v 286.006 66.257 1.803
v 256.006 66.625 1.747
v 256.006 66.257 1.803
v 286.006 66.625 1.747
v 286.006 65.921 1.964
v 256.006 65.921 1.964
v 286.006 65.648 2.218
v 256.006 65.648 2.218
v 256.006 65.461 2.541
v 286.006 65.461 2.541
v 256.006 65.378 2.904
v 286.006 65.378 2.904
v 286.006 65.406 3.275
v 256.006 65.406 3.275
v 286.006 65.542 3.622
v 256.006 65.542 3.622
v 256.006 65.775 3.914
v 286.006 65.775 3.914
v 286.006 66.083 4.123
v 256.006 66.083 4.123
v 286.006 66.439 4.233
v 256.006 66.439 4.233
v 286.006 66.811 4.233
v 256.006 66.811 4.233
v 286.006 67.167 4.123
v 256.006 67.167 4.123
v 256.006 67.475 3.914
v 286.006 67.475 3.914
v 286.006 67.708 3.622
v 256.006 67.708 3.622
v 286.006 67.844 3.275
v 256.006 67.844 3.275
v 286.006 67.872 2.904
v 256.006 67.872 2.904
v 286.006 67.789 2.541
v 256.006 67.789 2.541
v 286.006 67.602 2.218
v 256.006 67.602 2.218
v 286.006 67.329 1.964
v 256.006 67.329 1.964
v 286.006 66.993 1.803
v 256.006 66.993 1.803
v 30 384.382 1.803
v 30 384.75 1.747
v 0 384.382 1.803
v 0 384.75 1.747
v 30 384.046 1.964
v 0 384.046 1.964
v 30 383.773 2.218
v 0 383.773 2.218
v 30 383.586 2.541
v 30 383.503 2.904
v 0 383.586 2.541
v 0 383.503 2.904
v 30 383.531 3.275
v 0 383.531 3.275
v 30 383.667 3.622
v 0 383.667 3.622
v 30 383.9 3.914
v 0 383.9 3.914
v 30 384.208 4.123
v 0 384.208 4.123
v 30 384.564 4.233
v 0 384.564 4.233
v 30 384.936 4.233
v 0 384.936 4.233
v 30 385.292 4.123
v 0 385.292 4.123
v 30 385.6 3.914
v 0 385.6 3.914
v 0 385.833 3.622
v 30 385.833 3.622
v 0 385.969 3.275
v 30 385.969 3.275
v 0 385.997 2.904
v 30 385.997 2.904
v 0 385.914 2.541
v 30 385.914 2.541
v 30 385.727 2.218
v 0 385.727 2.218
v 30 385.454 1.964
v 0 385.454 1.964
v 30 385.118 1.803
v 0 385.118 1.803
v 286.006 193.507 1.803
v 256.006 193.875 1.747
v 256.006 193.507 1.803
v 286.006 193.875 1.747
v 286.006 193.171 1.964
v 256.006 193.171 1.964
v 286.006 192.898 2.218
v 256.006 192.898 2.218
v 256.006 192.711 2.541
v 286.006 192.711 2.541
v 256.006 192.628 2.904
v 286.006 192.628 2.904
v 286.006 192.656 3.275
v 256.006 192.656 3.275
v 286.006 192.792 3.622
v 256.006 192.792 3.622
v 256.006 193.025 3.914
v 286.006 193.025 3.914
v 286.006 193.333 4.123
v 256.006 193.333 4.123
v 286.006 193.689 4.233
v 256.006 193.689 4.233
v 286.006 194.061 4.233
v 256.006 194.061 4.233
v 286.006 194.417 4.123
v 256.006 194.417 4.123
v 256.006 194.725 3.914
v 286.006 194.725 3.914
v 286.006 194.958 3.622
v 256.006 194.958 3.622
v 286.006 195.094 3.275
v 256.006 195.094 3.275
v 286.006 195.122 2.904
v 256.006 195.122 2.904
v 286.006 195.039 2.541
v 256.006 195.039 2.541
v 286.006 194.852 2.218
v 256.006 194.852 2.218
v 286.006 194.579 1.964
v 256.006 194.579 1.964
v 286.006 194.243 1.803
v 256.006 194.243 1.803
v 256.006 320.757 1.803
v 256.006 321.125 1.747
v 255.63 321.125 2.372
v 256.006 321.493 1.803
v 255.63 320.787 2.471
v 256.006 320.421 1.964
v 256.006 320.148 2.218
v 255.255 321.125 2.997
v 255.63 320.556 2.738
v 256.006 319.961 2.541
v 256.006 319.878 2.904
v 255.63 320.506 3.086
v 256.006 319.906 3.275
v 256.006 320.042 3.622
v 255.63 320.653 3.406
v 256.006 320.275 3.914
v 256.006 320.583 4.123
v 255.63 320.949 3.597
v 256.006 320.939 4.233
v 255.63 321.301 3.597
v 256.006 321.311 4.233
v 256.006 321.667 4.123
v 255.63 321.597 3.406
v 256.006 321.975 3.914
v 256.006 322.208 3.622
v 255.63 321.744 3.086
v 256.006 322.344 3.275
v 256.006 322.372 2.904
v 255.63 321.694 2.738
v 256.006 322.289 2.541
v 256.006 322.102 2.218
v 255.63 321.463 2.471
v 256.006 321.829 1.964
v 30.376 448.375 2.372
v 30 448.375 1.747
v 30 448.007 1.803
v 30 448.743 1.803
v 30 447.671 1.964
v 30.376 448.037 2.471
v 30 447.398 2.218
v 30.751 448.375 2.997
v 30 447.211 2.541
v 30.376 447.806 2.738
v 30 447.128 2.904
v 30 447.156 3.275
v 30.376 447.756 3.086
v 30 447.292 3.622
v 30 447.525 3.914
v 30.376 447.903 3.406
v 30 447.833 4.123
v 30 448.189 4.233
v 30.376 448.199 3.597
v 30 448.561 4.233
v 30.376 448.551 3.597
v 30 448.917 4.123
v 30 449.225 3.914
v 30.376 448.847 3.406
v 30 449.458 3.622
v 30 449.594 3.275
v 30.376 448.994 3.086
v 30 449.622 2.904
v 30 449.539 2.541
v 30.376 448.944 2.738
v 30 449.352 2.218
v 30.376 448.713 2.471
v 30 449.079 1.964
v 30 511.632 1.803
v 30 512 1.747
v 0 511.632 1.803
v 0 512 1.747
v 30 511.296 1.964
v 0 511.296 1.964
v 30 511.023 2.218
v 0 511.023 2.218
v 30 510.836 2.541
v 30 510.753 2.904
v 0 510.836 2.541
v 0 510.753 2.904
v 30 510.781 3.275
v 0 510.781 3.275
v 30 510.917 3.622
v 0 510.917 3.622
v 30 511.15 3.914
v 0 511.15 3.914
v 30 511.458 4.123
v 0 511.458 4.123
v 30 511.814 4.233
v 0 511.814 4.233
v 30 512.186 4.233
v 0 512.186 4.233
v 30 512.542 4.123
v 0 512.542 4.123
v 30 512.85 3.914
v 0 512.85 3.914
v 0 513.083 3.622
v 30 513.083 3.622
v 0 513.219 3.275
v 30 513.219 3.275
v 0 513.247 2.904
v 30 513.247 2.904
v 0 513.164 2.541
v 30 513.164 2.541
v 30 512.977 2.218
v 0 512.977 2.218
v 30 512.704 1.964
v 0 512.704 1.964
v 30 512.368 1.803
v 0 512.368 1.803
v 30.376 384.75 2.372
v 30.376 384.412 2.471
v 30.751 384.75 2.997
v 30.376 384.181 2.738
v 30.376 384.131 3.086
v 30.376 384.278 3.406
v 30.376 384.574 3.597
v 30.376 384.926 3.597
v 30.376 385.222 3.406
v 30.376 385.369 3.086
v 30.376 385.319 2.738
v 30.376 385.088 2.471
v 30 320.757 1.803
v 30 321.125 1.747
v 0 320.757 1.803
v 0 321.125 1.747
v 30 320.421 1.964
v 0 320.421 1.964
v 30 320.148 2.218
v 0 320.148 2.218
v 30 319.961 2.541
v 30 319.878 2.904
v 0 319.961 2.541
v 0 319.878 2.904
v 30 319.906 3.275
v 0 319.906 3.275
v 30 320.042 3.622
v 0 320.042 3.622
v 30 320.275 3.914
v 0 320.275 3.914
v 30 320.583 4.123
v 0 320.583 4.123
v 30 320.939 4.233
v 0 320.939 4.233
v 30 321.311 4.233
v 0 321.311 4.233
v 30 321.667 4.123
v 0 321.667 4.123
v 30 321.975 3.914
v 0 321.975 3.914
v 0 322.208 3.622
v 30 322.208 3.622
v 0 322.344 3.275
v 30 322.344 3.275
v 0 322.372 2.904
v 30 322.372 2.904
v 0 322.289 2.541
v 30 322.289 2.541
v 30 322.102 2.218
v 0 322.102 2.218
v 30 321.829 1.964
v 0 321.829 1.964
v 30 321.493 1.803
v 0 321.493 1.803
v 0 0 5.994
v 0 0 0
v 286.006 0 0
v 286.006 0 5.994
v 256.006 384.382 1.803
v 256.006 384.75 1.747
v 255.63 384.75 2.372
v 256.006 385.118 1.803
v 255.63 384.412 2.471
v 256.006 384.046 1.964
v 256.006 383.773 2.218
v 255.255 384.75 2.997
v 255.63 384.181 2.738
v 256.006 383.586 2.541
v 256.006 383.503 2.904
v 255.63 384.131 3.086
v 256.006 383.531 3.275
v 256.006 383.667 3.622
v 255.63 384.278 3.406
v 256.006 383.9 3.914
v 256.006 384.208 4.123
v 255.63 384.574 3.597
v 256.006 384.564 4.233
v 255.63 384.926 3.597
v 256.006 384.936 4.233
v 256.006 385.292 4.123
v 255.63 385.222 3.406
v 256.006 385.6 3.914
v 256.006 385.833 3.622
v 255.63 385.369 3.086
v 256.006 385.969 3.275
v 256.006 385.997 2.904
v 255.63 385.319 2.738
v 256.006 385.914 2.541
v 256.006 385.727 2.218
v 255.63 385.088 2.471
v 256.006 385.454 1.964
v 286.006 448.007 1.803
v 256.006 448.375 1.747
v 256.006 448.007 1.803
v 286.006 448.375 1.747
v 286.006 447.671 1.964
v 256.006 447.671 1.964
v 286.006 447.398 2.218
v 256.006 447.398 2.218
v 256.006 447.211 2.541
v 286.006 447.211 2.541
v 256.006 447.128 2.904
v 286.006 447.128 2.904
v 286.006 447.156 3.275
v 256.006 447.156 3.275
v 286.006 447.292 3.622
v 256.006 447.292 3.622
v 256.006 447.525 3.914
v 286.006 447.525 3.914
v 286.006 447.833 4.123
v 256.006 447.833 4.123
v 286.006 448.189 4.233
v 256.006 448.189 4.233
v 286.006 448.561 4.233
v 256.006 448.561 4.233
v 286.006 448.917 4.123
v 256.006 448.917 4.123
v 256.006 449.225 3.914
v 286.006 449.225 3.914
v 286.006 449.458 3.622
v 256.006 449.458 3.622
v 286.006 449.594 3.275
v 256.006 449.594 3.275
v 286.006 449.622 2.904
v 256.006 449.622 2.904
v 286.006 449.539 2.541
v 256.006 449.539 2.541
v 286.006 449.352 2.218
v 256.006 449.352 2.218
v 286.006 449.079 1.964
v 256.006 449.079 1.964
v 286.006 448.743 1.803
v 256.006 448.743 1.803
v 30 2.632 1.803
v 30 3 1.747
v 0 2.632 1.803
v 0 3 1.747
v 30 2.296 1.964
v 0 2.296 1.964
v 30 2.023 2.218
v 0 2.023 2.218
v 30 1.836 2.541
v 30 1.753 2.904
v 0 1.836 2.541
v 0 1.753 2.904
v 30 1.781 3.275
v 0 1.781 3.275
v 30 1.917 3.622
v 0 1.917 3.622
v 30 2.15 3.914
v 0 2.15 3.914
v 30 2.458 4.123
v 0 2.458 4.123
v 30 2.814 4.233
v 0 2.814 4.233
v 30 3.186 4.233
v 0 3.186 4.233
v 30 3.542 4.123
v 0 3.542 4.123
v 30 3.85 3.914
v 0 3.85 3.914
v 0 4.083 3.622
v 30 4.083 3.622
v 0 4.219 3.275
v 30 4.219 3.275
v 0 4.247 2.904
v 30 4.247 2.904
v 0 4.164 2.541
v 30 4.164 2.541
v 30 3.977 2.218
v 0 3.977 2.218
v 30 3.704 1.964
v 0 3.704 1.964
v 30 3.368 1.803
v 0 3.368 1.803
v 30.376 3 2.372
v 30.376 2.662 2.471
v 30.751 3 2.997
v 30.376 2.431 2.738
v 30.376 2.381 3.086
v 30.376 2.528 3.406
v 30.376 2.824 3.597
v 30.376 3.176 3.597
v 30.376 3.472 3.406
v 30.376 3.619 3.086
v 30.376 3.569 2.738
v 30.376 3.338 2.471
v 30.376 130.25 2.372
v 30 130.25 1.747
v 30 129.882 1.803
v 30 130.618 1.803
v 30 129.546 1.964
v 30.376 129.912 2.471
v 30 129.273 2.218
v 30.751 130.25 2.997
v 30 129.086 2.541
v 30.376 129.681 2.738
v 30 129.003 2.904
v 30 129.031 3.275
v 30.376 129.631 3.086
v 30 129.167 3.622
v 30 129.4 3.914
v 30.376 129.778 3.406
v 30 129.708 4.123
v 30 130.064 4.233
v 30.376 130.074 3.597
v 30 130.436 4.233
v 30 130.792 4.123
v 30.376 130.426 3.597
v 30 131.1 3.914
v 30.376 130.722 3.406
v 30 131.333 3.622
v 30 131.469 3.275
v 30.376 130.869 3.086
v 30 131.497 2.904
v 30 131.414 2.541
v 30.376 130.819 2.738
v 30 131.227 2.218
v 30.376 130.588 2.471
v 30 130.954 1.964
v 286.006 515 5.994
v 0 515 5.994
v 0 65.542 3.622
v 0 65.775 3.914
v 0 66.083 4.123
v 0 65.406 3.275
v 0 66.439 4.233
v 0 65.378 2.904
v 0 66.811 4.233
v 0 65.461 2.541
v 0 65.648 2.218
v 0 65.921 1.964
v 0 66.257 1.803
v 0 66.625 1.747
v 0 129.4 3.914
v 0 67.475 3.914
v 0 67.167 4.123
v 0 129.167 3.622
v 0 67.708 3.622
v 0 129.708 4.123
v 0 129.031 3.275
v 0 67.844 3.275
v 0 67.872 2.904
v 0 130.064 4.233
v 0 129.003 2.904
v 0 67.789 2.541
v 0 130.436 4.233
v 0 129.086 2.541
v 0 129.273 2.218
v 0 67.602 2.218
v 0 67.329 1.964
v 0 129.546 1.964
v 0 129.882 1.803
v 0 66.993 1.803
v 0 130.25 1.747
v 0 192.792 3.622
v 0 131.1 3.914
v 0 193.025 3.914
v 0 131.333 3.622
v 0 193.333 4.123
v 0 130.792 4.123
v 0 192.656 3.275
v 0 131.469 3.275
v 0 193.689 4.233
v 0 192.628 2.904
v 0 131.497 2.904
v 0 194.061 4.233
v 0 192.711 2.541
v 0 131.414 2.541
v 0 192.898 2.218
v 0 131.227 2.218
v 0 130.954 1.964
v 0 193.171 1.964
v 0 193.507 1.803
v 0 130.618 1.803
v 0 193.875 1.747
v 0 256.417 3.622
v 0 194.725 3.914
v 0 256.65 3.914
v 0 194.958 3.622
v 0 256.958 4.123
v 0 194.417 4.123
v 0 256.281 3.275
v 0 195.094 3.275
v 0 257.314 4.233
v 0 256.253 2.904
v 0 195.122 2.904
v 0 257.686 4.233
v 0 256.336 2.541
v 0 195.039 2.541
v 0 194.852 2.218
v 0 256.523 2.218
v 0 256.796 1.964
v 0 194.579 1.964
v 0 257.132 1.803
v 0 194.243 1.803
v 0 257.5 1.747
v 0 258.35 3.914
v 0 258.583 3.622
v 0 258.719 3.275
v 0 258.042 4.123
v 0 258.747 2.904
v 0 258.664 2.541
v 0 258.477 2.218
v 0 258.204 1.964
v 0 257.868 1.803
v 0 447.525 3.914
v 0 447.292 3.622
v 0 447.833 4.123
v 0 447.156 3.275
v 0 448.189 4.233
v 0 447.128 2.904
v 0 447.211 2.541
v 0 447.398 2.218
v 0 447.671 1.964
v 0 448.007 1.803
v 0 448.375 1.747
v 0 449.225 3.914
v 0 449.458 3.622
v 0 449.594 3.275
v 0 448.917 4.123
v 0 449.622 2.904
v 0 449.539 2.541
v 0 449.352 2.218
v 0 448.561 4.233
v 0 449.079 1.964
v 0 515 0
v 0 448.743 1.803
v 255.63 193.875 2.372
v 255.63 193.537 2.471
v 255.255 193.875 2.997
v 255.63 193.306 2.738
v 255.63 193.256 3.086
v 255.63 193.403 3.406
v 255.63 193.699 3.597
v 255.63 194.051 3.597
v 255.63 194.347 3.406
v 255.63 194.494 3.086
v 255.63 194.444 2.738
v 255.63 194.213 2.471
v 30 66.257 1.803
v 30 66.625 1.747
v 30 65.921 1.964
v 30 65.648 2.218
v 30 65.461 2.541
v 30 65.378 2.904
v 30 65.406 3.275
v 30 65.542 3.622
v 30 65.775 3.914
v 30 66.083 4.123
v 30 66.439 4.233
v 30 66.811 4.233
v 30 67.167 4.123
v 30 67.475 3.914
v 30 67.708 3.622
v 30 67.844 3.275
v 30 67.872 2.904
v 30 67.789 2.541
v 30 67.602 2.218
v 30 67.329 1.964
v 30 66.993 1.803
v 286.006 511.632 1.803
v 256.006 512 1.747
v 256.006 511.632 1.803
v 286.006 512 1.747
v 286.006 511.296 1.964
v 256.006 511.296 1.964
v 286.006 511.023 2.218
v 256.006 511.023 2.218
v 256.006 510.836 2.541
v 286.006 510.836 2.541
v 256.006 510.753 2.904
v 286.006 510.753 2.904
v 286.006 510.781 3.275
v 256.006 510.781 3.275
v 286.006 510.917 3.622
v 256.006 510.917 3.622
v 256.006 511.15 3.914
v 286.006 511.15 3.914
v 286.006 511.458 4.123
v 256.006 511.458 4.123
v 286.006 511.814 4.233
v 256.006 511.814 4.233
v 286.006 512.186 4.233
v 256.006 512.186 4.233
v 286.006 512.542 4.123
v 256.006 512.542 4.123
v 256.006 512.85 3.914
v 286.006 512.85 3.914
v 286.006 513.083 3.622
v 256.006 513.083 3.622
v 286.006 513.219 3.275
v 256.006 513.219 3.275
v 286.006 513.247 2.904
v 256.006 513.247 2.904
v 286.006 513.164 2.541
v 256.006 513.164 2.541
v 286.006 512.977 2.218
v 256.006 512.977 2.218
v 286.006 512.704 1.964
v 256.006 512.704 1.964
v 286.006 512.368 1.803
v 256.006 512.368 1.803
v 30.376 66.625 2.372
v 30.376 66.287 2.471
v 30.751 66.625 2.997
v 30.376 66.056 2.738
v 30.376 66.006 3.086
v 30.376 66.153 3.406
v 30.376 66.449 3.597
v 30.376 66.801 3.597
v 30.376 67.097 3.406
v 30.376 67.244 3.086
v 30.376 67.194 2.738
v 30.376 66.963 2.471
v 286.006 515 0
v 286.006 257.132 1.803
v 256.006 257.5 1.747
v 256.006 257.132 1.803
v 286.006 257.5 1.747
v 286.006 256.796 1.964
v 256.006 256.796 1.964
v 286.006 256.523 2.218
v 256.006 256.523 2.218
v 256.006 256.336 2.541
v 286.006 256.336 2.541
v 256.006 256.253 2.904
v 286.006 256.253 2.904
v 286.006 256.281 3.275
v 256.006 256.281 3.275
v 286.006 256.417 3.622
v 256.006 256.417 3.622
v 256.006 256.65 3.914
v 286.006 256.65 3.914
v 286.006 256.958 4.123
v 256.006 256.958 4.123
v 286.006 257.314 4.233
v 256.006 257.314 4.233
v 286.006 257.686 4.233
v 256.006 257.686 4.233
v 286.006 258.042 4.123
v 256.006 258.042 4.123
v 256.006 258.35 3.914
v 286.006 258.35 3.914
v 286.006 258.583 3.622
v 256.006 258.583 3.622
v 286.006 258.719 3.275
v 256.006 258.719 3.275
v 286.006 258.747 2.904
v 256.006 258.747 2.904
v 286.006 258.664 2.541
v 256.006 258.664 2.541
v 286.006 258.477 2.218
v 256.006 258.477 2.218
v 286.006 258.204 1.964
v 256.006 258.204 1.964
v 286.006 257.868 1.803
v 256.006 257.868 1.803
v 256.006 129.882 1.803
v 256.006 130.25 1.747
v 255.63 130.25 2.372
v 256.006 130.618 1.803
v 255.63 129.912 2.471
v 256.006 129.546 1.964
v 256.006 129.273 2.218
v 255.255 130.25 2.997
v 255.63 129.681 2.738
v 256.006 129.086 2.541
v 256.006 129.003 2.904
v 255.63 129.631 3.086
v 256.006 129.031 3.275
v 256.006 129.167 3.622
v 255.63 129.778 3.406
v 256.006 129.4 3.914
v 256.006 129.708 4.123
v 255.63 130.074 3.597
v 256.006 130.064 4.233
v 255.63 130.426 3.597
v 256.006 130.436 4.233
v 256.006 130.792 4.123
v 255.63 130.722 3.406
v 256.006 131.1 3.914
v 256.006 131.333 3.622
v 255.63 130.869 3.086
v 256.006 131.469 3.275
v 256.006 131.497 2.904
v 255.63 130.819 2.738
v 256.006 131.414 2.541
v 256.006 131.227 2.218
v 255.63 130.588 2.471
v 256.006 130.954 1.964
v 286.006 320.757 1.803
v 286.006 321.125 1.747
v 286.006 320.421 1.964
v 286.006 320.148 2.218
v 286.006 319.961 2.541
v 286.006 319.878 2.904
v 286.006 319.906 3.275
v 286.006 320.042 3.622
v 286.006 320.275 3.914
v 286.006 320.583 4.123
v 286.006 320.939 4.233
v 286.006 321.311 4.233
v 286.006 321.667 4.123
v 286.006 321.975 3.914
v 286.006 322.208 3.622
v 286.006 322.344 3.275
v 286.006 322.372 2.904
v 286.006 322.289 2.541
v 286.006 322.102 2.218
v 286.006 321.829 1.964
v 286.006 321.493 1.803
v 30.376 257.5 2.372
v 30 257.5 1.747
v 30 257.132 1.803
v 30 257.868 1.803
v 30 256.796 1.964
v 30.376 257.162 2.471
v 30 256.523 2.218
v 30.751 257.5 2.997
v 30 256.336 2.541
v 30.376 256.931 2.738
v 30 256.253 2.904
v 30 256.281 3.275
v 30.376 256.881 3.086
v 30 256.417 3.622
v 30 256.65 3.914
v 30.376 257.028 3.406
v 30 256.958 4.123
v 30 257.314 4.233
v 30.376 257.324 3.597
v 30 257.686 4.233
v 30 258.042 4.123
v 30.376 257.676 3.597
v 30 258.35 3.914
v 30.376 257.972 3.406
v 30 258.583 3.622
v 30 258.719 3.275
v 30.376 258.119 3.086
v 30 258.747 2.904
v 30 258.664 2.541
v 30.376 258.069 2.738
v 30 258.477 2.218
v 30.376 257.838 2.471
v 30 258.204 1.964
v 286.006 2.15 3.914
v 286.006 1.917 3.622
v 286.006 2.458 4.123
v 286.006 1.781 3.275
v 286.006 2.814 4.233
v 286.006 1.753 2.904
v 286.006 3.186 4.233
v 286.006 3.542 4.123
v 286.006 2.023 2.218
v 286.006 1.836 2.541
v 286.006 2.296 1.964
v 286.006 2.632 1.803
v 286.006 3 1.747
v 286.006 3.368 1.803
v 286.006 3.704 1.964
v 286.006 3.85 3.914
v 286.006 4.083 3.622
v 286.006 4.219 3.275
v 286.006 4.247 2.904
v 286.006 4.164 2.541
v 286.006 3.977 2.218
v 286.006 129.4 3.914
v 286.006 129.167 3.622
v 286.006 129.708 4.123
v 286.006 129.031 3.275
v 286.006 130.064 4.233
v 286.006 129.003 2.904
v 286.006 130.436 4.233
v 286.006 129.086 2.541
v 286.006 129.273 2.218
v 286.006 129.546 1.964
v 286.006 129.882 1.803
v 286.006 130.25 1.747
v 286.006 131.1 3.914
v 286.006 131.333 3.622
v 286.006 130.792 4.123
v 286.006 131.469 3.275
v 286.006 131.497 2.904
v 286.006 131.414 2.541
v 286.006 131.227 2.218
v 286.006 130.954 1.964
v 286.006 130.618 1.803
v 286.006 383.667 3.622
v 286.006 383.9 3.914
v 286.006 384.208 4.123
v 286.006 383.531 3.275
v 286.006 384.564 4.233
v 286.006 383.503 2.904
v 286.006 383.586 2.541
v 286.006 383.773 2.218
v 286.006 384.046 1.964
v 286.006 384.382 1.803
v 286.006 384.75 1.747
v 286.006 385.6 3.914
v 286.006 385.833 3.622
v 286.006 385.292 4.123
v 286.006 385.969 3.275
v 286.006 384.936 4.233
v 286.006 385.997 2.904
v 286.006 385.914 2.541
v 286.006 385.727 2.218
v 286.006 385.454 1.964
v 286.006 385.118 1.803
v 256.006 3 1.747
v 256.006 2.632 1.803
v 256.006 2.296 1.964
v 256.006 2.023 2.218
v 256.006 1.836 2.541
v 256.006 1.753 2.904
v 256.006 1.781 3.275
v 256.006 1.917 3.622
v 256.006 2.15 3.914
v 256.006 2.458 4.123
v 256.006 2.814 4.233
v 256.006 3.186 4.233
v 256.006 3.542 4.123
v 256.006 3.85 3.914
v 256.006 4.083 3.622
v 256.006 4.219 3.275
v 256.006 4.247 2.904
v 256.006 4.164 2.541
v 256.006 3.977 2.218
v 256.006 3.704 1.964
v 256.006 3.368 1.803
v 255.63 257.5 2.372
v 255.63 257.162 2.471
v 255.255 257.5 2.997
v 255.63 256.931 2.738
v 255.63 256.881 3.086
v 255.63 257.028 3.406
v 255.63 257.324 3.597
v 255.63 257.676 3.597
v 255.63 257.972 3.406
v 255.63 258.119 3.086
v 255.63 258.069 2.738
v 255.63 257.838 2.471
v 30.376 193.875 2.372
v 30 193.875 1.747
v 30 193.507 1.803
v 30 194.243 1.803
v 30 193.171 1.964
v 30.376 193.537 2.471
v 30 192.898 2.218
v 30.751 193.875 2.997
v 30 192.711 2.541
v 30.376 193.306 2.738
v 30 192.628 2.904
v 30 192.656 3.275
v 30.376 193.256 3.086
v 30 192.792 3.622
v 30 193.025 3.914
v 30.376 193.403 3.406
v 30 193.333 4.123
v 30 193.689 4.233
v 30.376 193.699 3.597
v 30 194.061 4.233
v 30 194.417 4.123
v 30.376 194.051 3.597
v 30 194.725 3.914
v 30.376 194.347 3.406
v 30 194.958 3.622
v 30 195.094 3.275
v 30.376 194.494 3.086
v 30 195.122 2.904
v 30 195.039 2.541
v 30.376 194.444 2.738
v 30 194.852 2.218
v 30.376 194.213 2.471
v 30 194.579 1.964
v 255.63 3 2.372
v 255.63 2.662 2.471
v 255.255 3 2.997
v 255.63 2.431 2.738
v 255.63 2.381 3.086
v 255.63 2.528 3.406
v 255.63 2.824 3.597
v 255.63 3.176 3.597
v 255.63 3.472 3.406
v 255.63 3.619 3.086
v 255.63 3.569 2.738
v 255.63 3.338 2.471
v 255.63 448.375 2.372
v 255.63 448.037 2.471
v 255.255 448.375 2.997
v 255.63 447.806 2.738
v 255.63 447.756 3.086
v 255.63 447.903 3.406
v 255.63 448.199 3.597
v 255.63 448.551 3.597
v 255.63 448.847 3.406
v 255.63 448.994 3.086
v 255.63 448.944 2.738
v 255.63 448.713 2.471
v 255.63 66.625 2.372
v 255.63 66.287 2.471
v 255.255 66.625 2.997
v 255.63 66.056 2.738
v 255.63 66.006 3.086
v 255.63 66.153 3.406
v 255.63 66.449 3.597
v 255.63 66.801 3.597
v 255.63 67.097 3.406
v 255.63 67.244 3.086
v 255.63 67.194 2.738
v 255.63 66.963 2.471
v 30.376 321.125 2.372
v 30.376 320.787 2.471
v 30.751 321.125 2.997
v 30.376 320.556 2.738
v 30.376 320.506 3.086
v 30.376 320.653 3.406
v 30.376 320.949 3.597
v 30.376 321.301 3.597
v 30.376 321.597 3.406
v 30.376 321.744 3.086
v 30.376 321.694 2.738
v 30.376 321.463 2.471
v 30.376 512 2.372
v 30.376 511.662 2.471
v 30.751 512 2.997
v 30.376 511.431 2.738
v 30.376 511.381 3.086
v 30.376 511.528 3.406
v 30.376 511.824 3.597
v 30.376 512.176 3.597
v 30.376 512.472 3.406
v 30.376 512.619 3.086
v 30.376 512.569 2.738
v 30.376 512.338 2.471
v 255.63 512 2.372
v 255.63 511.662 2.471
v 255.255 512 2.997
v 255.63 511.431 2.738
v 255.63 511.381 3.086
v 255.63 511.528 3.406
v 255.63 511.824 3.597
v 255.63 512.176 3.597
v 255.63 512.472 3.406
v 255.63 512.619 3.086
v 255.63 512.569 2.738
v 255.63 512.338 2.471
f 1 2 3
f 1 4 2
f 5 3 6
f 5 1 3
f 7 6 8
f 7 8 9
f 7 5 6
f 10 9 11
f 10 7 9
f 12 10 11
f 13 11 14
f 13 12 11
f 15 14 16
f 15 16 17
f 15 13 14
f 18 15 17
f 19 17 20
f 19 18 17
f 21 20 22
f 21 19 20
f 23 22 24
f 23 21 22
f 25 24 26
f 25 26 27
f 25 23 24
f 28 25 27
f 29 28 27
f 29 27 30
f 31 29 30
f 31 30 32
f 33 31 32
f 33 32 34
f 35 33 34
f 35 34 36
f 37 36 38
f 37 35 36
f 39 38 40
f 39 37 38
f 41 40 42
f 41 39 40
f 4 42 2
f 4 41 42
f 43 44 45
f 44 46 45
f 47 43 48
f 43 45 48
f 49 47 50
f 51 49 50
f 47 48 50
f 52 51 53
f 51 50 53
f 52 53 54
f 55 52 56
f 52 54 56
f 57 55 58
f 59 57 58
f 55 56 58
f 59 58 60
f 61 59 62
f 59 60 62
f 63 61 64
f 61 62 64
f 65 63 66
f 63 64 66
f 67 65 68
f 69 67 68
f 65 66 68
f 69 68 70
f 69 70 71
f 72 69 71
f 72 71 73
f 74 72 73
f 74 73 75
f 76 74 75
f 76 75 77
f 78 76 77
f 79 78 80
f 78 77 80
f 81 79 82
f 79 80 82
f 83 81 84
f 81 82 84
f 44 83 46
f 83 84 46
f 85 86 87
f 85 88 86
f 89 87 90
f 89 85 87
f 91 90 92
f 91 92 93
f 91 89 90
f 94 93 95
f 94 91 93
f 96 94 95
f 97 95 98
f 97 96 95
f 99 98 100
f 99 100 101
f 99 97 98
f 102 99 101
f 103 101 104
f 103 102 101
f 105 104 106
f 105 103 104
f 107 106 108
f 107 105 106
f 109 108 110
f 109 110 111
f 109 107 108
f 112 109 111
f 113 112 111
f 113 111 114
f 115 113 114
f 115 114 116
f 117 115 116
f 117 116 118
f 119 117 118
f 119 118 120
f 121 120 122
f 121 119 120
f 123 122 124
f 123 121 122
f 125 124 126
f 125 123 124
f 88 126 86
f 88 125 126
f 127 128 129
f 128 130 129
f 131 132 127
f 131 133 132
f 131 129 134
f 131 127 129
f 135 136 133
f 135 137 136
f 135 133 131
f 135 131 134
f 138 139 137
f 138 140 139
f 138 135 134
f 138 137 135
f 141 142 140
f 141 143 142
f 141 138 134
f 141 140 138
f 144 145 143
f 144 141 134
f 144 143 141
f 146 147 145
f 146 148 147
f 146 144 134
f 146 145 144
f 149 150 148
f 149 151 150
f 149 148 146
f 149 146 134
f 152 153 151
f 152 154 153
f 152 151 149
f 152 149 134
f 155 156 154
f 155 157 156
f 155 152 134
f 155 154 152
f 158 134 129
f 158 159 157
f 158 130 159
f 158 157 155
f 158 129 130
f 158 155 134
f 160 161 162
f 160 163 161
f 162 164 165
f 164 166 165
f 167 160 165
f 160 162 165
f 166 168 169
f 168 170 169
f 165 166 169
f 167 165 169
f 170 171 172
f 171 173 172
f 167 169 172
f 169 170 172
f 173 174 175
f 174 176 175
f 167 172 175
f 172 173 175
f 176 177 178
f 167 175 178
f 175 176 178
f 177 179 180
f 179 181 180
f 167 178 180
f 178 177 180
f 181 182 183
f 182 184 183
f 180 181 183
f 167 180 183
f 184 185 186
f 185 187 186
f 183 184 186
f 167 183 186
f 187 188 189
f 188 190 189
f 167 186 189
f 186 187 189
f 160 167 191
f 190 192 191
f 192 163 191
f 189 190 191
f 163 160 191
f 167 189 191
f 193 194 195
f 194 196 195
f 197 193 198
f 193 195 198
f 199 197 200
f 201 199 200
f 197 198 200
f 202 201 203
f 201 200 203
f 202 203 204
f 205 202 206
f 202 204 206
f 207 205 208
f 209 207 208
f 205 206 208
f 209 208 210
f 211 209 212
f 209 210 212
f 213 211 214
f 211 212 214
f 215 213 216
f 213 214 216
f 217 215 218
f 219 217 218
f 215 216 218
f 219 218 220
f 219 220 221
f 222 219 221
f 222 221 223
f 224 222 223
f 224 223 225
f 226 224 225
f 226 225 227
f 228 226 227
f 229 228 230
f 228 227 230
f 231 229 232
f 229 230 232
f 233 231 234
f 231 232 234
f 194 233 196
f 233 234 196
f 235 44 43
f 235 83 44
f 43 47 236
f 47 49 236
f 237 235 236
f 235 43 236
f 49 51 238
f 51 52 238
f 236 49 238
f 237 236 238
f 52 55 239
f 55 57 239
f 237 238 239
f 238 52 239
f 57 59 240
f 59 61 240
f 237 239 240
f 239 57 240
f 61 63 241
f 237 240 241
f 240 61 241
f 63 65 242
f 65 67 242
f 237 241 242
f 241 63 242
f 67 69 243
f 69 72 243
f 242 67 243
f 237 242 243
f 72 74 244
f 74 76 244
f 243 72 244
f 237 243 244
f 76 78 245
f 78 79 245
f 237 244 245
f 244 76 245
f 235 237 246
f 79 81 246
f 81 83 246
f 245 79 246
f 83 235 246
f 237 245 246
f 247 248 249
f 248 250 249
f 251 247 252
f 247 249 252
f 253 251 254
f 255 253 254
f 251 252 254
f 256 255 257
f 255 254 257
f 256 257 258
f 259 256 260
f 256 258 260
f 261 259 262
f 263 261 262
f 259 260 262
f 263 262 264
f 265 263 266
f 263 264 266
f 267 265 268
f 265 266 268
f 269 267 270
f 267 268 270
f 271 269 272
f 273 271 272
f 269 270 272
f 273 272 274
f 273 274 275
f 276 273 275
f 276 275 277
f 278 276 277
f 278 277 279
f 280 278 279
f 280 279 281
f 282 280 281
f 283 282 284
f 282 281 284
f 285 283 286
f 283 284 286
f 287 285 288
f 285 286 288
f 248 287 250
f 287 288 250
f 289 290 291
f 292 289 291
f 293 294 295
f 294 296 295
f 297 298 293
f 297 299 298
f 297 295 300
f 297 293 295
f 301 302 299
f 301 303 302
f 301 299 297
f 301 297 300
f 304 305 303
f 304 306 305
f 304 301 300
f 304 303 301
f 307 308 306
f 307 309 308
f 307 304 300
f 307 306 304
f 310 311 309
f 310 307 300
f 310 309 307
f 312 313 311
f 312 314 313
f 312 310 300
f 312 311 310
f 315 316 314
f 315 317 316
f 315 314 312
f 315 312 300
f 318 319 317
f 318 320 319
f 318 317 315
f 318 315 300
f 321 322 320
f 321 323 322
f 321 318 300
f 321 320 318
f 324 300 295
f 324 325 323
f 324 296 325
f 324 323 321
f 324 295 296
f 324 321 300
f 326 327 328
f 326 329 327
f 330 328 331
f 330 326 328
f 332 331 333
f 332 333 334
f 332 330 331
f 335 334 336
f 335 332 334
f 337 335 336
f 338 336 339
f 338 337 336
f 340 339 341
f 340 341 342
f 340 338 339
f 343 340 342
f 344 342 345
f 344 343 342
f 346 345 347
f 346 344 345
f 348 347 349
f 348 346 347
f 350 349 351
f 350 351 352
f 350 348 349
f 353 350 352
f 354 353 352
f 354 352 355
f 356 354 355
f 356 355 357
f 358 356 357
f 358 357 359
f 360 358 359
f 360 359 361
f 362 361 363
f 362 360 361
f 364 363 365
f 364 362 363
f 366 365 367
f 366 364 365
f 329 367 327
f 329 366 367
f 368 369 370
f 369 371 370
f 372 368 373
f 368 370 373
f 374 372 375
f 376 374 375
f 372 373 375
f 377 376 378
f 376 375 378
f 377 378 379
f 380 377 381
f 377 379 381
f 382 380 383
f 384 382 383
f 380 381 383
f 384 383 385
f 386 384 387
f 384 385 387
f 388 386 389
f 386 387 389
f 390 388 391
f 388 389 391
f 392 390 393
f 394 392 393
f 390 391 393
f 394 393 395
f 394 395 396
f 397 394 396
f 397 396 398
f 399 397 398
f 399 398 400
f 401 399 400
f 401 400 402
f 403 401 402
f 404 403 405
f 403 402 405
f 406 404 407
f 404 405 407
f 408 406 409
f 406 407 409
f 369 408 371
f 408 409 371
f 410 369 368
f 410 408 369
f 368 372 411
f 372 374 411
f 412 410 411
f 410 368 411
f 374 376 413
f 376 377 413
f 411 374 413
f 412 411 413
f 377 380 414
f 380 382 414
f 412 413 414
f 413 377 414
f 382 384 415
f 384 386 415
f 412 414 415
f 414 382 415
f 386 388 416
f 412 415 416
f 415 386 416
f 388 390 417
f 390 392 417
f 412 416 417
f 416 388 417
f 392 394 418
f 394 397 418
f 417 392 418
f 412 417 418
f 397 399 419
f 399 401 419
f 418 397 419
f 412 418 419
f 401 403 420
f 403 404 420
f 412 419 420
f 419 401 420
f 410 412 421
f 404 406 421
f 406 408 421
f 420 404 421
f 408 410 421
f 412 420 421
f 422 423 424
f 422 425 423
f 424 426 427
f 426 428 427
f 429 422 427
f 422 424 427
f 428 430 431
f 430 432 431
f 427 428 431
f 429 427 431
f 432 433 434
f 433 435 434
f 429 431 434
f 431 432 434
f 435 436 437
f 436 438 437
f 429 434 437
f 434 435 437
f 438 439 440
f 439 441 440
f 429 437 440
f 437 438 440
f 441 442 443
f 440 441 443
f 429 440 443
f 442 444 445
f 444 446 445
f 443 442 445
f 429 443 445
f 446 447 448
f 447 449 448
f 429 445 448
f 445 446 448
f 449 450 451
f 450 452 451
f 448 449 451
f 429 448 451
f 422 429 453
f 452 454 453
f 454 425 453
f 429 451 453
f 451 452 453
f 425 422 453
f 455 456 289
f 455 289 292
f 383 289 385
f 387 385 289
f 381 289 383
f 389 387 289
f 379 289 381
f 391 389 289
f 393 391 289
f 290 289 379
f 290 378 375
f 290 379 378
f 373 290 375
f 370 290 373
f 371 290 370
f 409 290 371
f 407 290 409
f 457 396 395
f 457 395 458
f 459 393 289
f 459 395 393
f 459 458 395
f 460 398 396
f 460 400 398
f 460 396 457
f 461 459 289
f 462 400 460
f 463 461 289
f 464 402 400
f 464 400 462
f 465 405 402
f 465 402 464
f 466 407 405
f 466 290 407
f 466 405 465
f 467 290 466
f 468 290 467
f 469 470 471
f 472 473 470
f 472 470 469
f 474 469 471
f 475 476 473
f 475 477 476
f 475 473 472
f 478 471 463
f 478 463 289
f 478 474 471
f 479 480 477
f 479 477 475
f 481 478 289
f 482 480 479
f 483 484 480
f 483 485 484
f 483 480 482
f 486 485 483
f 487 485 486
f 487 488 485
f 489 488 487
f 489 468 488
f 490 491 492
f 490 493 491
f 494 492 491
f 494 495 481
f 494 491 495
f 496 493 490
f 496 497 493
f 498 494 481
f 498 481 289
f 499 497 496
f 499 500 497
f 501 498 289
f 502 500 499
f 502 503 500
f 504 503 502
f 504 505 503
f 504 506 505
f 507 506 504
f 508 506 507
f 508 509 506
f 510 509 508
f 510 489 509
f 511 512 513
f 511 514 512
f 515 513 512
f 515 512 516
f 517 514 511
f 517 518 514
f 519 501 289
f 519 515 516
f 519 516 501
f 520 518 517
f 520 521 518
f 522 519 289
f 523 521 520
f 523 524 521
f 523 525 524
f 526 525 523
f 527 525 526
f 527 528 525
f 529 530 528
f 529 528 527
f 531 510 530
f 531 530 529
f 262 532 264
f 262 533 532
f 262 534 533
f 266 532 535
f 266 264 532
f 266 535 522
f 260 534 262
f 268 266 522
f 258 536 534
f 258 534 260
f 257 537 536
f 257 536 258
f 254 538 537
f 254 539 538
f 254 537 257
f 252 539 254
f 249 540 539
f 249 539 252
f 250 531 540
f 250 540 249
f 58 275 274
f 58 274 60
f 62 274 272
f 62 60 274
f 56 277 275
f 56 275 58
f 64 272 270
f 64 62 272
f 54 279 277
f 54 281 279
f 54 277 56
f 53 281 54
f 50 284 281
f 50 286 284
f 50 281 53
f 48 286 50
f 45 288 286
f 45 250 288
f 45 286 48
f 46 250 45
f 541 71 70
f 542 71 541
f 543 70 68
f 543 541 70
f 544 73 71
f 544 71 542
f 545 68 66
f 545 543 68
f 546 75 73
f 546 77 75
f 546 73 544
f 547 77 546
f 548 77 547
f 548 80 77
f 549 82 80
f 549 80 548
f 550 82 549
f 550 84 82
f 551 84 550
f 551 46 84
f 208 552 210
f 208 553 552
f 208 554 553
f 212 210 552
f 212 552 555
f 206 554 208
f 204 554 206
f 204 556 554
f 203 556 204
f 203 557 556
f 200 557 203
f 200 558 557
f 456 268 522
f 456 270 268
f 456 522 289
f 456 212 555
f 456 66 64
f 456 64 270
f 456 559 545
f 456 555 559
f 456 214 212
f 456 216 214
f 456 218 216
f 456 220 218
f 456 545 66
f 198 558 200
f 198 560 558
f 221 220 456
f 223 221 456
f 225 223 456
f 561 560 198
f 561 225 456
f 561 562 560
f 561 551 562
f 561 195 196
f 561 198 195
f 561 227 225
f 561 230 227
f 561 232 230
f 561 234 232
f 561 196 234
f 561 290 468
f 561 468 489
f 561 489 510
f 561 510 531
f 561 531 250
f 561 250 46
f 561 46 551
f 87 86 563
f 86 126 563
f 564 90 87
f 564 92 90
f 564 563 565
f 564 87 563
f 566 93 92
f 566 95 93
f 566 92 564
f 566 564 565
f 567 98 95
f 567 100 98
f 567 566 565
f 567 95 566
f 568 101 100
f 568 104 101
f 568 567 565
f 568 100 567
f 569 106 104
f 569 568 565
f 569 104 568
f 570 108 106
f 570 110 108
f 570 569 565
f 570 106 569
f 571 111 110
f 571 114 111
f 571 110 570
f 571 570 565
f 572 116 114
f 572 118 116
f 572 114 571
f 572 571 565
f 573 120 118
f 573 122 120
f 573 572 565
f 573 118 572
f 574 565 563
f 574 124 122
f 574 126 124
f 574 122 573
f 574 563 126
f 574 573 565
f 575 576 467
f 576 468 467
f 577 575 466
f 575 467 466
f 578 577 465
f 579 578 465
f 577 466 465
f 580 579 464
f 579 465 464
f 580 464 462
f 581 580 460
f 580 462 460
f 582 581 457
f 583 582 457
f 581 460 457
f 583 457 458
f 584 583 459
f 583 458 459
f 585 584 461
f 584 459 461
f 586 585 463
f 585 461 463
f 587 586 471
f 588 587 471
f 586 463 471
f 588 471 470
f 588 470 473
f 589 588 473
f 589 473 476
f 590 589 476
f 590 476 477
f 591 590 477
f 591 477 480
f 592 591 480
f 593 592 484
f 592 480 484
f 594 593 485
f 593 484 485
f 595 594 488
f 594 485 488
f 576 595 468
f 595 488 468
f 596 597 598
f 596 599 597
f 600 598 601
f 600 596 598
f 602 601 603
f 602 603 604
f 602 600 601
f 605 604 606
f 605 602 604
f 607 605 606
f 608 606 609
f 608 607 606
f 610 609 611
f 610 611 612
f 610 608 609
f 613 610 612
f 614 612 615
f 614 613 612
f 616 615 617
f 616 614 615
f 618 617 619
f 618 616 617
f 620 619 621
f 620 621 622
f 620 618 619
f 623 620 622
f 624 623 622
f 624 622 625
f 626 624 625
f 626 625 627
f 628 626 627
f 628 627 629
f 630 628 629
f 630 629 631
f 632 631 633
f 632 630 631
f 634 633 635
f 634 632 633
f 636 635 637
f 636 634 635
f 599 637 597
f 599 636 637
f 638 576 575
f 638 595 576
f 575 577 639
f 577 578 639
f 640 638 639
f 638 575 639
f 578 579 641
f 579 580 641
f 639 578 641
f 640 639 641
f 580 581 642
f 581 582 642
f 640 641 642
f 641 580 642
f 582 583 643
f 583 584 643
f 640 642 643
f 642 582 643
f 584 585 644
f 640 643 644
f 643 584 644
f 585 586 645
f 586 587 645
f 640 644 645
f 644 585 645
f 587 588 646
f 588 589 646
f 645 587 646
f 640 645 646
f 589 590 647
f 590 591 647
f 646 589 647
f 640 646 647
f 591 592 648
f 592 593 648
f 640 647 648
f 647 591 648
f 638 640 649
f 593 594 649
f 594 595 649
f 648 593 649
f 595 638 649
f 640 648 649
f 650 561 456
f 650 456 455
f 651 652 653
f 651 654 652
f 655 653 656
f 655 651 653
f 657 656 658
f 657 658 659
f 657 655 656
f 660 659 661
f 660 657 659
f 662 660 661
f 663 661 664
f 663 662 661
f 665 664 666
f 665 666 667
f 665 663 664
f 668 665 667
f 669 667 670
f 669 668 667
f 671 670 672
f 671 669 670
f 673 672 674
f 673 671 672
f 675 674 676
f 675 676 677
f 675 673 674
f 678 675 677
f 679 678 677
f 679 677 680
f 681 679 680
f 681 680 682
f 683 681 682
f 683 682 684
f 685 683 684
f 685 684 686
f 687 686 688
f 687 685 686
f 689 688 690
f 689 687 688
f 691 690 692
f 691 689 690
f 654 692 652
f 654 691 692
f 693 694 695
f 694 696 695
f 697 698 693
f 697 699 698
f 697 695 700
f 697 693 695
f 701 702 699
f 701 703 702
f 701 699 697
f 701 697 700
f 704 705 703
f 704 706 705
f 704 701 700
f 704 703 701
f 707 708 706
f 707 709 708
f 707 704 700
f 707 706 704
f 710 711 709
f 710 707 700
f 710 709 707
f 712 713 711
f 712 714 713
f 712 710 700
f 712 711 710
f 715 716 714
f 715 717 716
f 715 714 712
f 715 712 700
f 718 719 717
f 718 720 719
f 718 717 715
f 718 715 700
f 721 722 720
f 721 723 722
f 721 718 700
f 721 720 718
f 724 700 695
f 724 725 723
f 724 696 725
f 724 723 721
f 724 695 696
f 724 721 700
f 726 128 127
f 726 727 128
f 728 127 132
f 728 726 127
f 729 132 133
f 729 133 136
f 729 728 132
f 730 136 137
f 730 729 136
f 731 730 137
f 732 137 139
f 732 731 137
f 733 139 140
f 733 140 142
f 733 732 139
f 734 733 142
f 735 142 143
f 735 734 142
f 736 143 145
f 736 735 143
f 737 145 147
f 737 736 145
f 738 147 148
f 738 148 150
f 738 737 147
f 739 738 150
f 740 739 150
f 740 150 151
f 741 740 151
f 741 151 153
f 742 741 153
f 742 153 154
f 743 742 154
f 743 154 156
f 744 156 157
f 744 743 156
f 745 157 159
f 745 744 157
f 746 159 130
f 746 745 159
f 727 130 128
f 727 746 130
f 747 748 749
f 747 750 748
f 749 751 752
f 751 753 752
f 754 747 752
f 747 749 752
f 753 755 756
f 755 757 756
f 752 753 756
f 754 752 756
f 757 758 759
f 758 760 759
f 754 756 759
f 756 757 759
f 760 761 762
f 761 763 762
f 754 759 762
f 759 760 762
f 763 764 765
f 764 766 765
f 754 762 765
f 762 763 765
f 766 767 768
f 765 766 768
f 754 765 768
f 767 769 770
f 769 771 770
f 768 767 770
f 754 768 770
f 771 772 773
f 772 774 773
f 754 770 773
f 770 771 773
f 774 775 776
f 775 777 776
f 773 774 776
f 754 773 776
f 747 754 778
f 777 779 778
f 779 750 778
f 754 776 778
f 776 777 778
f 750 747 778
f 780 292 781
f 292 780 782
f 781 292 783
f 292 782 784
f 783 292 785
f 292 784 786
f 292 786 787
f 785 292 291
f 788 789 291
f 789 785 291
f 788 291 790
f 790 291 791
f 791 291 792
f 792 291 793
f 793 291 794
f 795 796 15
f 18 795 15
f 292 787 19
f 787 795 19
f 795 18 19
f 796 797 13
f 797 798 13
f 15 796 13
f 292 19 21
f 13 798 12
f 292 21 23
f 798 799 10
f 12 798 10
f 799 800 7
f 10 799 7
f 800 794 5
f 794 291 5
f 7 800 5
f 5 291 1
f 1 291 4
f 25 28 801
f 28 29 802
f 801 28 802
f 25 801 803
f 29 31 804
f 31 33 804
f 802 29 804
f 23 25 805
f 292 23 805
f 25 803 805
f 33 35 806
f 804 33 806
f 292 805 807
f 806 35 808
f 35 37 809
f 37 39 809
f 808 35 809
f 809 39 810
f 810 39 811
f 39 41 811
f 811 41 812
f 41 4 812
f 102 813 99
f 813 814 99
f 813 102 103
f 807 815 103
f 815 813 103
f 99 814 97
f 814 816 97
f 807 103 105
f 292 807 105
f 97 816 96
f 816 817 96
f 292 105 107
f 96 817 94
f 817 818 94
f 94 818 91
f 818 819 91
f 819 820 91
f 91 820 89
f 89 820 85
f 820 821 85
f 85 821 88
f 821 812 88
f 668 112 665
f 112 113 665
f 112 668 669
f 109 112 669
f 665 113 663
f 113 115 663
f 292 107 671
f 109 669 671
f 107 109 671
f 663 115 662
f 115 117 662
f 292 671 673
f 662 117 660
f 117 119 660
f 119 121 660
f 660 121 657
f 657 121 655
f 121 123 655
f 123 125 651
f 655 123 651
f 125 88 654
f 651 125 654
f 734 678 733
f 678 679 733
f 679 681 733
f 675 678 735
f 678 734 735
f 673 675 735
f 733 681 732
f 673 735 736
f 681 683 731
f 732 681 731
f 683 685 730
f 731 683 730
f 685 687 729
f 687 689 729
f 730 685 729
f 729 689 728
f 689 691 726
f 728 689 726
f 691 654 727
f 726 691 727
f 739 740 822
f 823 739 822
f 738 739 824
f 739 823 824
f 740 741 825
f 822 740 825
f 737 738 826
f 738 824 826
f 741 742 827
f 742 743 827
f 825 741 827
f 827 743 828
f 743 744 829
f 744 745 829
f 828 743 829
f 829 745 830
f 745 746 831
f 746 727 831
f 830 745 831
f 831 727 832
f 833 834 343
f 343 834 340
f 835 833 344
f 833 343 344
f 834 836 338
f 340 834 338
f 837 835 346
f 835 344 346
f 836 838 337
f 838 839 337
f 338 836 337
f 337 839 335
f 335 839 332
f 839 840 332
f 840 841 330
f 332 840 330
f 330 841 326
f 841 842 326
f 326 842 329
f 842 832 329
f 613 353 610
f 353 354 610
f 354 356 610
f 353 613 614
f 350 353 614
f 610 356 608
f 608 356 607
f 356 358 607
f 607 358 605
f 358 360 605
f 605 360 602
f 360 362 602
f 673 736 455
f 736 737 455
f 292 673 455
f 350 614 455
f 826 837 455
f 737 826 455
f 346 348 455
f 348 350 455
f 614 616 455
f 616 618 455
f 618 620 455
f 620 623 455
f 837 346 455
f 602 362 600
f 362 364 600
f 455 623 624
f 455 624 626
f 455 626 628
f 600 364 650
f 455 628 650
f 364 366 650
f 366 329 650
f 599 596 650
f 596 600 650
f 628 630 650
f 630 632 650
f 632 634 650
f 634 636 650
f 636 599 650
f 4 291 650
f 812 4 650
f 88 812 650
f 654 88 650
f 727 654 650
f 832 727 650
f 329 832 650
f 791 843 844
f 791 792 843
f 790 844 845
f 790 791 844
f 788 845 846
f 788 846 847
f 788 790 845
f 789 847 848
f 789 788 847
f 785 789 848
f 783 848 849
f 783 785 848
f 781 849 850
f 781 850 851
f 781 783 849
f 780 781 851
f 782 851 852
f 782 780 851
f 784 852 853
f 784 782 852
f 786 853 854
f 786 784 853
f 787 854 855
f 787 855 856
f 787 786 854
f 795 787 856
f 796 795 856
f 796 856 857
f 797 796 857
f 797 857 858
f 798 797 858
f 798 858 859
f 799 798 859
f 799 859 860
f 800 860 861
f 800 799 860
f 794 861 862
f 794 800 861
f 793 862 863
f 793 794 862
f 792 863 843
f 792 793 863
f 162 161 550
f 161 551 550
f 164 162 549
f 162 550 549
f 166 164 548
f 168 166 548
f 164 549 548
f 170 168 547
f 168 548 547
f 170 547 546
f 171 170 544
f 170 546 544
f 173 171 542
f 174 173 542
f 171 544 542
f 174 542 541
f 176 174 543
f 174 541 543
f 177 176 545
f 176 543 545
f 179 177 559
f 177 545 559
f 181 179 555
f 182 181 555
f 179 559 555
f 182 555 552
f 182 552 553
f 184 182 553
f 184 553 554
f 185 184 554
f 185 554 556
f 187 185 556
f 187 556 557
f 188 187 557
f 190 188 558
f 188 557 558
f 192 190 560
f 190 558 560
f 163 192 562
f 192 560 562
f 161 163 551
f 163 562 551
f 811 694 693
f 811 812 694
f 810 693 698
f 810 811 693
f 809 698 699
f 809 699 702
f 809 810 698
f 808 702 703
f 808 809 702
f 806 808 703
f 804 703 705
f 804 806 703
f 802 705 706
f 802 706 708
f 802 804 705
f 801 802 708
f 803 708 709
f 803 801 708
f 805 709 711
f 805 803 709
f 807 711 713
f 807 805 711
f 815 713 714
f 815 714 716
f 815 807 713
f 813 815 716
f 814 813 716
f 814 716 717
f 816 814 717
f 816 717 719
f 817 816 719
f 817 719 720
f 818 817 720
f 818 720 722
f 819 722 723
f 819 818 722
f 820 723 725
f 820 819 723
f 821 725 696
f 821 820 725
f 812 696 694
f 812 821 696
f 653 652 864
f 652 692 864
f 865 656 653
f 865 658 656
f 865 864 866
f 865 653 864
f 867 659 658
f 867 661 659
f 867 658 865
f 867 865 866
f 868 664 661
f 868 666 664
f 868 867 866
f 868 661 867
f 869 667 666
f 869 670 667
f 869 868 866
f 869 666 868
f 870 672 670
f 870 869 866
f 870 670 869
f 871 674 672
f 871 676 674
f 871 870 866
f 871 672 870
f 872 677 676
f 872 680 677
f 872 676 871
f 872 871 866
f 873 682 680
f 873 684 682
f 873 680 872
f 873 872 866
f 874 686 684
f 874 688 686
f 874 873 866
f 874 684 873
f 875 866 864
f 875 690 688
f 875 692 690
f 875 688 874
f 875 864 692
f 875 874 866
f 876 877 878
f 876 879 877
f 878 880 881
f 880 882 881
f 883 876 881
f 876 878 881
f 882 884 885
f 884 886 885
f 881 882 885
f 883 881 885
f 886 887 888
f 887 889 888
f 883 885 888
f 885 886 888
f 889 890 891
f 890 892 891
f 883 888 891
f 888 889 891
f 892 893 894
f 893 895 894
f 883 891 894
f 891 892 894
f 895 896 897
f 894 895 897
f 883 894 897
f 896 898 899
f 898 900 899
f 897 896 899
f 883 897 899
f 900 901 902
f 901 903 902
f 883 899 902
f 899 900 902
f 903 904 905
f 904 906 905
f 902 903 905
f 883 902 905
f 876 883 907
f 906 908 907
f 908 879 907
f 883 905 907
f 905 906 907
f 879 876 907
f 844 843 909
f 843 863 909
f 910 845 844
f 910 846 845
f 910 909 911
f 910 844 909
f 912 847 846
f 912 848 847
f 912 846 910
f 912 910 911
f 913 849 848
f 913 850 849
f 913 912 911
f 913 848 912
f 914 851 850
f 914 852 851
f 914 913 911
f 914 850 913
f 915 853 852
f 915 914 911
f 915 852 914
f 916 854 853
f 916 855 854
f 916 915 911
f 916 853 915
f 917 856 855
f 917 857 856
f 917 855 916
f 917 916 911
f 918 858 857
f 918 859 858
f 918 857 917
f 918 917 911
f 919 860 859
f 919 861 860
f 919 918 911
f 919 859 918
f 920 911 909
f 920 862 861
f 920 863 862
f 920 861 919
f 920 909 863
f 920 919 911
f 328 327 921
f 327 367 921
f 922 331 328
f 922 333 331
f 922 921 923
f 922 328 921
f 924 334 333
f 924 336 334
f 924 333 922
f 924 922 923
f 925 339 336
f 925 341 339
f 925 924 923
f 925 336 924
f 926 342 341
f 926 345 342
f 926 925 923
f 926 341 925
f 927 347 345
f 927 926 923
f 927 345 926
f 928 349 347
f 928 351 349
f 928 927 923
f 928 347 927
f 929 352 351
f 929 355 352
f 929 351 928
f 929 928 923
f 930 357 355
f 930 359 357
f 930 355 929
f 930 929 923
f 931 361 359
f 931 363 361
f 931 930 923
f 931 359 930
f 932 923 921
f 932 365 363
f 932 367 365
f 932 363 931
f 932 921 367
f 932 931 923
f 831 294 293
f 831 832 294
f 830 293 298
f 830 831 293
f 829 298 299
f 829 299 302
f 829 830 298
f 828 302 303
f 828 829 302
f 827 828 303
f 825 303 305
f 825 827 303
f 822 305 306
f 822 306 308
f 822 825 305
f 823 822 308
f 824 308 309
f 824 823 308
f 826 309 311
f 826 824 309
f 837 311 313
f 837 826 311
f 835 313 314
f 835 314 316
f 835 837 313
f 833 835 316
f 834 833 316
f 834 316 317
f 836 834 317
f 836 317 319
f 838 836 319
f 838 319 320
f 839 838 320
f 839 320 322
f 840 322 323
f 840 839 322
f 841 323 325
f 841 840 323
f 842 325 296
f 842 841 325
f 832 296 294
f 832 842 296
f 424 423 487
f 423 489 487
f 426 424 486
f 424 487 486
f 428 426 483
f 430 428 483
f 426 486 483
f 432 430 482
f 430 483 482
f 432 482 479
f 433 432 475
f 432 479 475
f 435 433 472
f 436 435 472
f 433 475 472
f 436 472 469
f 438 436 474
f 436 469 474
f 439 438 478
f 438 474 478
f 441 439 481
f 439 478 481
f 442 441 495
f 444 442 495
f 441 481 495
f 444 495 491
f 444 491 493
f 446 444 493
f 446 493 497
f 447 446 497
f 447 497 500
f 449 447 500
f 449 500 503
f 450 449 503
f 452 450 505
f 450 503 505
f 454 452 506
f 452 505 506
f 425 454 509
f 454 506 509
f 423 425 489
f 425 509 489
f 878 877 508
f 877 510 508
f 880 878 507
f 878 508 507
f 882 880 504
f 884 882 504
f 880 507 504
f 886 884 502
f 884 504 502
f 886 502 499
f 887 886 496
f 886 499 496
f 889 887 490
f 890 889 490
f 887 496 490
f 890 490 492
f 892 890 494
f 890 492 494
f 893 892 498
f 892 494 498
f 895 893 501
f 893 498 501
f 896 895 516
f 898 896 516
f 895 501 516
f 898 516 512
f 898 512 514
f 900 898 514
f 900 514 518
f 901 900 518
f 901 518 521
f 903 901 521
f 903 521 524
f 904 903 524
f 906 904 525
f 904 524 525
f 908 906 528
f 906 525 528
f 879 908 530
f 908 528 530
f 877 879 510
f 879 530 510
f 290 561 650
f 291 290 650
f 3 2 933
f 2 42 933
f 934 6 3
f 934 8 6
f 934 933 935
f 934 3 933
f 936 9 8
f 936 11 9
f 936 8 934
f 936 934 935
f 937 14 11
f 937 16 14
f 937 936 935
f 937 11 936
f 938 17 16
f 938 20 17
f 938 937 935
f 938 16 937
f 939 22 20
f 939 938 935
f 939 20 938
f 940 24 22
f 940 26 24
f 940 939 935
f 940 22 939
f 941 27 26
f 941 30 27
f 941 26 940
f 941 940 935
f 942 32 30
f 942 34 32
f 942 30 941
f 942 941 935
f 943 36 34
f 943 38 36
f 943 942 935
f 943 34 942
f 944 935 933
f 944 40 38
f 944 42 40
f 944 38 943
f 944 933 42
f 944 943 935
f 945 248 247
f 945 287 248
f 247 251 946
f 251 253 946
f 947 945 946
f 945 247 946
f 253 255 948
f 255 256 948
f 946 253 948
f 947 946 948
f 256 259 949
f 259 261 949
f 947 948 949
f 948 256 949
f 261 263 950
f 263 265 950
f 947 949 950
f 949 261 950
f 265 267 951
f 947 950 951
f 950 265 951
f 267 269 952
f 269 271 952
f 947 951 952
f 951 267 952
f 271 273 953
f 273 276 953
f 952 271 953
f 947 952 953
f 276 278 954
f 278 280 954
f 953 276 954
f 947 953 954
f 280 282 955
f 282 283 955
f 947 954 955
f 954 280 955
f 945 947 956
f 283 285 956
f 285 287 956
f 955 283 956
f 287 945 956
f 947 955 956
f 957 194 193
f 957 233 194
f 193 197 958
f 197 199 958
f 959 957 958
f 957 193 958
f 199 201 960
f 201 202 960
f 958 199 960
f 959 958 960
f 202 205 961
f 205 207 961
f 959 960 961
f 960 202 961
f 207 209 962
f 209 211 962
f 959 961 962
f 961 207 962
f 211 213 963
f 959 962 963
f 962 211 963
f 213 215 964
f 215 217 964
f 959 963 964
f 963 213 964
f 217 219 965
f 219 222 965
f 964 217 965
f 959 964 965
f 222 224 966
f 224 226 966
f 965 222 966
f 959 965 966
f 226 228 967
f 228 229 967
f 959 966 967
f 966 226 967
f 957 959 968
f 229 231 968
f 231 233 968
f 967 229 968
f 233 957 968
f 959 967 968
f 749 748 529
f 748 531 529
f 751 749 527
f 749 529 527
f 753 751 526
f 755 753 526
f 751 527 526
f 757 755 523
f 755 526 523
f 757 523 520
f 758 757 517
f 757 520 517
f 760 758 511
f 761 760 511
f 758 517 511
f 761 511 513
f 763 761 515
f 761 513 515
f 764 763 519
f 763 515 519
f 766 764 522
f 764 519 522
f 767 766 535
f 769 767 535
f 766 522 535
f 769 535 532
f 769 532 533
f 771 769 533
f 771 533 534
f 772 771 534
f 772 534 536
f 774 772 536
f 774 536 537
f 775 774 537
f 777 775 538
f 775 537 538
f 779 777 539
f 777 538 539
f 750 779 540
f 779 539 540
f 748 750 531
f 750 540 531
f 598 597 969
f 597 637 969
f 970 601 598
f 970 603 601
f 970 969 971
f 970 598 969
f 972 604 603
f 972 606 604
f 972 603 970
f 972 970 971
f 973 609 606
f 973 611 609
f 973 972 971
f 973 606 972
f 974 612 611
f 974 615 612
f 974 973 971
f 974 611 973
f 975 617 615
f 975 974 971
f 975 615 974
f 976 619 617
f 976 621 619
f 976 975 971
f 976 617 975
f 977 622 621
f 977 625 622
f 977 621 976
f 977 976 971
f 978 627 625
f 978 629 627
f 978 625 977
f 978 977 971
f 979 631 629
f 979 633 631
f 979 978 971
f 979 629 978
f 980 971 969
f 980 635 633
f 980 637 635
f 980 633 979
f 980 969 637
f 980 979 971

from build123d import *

# Parameters (mm, degrees)
SKETCH1_W           = 286.0056
SKETCH1_H           = 515
BOSS_EXTRUDE1_DEPTH = 5.9944
LPATTERN1_COUNT     = 5
LPATTERN1_PITCH     = 63.625
LPATTERN1_COL_COUNT = 5
LPATTERN1_COL_PITCH = 63.625


with BuildPart() as part:
    # Sketch1 → Boss-Extrude1 (new body)
    with BuildSketch(Plane.XY):
        with Locations((143.0028, 257.5)):
            Rectangle(SKETCH1_W, SKETCH1_H)
    extrude(amount=BOSS_EXTRUDE1_DEPTH)

    # Sketch2 → Tap Drill for M3x0.5 Tap1 (revolve, cut)
    with BuildSketch(Plane(origin=(286.0056, 257.5, 2.9972), x_dir=(0, 0, -1), z_dir=(0, 1, 0))):
        Polygon((0, 0), (0, 30.751075774), (1.25, 30), (1.25, 0), align=None)
    tap_drill_for_m3x0_5_tap1 = revolve(axis=Axis((292.3556, 257.5, 2.9972), (-1, 0, 0)), mode=Mode.SUBTRACT)

    # LPattern1: Tap Drill for M3x0.5 Tap1 ×5
    with Locations(*[(0, i * LPATTERN1_PITCH, 0) for i in range(1, LPATTERN1_COUNT)]):
        add(tap_drill_for_m3x0_5_tap1, mode=Mode.SUBTRACT)

    # LPattern1 col: Tap Drill for M3x0.5 Tap1 ×5
    with Locations(*[(0, -i * LPATTERN1_COL_PITCH, 0) for i in range(1, LPATTERN1_COL_COUNT)]):
        add(tap_drill_for_m3x0_5_tap1, mode=Mode.SUBTRACT)

    # Mirror1: Tap Drill for M3x0.5 Tap1 across plane
    add(tap_drill_for_m3x0_5_tap1.mirror(Plane(origin=(143.0028, 0, 0), x_dir=(0, 0, 1), z_dir=(1, 0, 0))), mode=Mode.SUBTRACT)

    # Mirror1 copy 1 sketch → Mirror1 copy 1 (revolve, cut)
    with BuildSketch(Plane(origin=(0, 321.125, 2.9972), x_dir=(0, 0, -1), z_dir=(0, 1, 0))):
        Polygon((0, 0), (0, -30.751075774), (1.25, -30), (1.25, 0), align=None)
    revolve(axis=Axis((-6.35, 321.125, 2.9972), (-1, 0, 0)), mode=Mode.SUBTRACT)

    # Mirror1 copy 2 sketch → Mirror1 copy 2 (revolve, cut)
    with BuildSketch(Plane(origin=(0, 384.75, 2.9972), x_dir=(0, 0, -1), z_dir=(0, 1, 0))):
        Polygon((0, 0), (0, -30.751075774), (1.25, -30), (1.25, 0), align=None)
    revolve(axis=Axis((-6.35, 384.75, 2.9972), (-1, 0, 0)), mode=Mode.SUBTRACT)

    # Mirror1 copy 3 sketch → Mirror1 copy 3 (revolve, cut)
    with BuildSketch(Plane(origin=(0, 448.375, 2.9972), x_dir=(0, 0, -1), z_dir=(0, 1, 0))):
        Polygon((0, 0), (0, -30.751075774), (1.25, -30), (1.25, 0), align=None)
    revolve(axis=Axis((-6.35, 448.375, 2.9972), (-1, 0, 0)), mode=Mode.SUBTRACT)

    # Mirror1 copy 4 sketch → Mirror1 copy 4 (revolve, cut)
    with BuildSketch(Plane(origin=(0, 512, 2.9972), x_dir=(0, 0, -1), z_dir=(0, 1, 0))):
        Polygon((0, 0), (0, -30.751075774), (1.25, -30), (1.25, 0), align=None)
    revolve(axis=Axis((-6.35, 512, 2.9972), (-1, 0, 0)), mode=Mode.SUBTRACT)

    # Mirror1 copy 5 sketch → Mirror1 copy 5 (revolve, cut)
    with BuildSketch(Plane(origin=(0, 193.875, 2.9972), x_dir=(0, 0, -1), z_dir=(0, 1, 0))):
        Polygon((0, 0), (0, -30.751075774), (1.25, -30), (1.25, 0), align=None)
    revolve(axis=Axis((-6.35, 193.875, 2.9972), (-1, 0, 0)), mode=Mode.SUBTRACT)

    # Mirror1 copy 6 sketch → Mirror1 copy 6 (revolve, cut)
    with BuildSketch(Plane(origin=(0, 130.25, 2.9972), x_dir=(0, 0, -1), z_dir=(0, 1, 0))):
        Polygon((0, 0), (0, -30.751075774), (1.25, -30), (1.25, 0), align=None)
    revolve(axis=Axis((-6.35, 130.25, 2.9972), (-1, 0, 0)), mode=Mode.SUBTRACT)

    # Mirror1 copy 7 sketch → Mirror1 copy 7 (revolve, cut)
    with BuildSketch(Plane(origin=(0, 66.625, 2.9972), x_dir=(0, 0, -1), z_dir=(0, 1, 0))):
        Polygon((0, 0), (0, -30.751075774), (1.25, -30), (1.25, 0), align=None)
    revolve(axis=Axis((-6.35, 66.625, 2.9972), (-1, 0, 0)), mode=Mode.SUBTRACT)

    # Mirror1 copy 8 sketch → Mirror1 copy 8 (revolve, cut)
    with BuildSketch(Plane(origin=(0, 3, 2.9972), x_dir=(0, 0, -1), z_dir=(0, 1, 0))):
        Polygon((0, 0), (0, -30.751075774), (1.25, -30), (1.25, 0), align=None)
    revolve(axis=Axis((-6.35, 3, 2.9972), (-1, 0, 0)), mode=Mode.SUBTRACT)


solid = part.part
